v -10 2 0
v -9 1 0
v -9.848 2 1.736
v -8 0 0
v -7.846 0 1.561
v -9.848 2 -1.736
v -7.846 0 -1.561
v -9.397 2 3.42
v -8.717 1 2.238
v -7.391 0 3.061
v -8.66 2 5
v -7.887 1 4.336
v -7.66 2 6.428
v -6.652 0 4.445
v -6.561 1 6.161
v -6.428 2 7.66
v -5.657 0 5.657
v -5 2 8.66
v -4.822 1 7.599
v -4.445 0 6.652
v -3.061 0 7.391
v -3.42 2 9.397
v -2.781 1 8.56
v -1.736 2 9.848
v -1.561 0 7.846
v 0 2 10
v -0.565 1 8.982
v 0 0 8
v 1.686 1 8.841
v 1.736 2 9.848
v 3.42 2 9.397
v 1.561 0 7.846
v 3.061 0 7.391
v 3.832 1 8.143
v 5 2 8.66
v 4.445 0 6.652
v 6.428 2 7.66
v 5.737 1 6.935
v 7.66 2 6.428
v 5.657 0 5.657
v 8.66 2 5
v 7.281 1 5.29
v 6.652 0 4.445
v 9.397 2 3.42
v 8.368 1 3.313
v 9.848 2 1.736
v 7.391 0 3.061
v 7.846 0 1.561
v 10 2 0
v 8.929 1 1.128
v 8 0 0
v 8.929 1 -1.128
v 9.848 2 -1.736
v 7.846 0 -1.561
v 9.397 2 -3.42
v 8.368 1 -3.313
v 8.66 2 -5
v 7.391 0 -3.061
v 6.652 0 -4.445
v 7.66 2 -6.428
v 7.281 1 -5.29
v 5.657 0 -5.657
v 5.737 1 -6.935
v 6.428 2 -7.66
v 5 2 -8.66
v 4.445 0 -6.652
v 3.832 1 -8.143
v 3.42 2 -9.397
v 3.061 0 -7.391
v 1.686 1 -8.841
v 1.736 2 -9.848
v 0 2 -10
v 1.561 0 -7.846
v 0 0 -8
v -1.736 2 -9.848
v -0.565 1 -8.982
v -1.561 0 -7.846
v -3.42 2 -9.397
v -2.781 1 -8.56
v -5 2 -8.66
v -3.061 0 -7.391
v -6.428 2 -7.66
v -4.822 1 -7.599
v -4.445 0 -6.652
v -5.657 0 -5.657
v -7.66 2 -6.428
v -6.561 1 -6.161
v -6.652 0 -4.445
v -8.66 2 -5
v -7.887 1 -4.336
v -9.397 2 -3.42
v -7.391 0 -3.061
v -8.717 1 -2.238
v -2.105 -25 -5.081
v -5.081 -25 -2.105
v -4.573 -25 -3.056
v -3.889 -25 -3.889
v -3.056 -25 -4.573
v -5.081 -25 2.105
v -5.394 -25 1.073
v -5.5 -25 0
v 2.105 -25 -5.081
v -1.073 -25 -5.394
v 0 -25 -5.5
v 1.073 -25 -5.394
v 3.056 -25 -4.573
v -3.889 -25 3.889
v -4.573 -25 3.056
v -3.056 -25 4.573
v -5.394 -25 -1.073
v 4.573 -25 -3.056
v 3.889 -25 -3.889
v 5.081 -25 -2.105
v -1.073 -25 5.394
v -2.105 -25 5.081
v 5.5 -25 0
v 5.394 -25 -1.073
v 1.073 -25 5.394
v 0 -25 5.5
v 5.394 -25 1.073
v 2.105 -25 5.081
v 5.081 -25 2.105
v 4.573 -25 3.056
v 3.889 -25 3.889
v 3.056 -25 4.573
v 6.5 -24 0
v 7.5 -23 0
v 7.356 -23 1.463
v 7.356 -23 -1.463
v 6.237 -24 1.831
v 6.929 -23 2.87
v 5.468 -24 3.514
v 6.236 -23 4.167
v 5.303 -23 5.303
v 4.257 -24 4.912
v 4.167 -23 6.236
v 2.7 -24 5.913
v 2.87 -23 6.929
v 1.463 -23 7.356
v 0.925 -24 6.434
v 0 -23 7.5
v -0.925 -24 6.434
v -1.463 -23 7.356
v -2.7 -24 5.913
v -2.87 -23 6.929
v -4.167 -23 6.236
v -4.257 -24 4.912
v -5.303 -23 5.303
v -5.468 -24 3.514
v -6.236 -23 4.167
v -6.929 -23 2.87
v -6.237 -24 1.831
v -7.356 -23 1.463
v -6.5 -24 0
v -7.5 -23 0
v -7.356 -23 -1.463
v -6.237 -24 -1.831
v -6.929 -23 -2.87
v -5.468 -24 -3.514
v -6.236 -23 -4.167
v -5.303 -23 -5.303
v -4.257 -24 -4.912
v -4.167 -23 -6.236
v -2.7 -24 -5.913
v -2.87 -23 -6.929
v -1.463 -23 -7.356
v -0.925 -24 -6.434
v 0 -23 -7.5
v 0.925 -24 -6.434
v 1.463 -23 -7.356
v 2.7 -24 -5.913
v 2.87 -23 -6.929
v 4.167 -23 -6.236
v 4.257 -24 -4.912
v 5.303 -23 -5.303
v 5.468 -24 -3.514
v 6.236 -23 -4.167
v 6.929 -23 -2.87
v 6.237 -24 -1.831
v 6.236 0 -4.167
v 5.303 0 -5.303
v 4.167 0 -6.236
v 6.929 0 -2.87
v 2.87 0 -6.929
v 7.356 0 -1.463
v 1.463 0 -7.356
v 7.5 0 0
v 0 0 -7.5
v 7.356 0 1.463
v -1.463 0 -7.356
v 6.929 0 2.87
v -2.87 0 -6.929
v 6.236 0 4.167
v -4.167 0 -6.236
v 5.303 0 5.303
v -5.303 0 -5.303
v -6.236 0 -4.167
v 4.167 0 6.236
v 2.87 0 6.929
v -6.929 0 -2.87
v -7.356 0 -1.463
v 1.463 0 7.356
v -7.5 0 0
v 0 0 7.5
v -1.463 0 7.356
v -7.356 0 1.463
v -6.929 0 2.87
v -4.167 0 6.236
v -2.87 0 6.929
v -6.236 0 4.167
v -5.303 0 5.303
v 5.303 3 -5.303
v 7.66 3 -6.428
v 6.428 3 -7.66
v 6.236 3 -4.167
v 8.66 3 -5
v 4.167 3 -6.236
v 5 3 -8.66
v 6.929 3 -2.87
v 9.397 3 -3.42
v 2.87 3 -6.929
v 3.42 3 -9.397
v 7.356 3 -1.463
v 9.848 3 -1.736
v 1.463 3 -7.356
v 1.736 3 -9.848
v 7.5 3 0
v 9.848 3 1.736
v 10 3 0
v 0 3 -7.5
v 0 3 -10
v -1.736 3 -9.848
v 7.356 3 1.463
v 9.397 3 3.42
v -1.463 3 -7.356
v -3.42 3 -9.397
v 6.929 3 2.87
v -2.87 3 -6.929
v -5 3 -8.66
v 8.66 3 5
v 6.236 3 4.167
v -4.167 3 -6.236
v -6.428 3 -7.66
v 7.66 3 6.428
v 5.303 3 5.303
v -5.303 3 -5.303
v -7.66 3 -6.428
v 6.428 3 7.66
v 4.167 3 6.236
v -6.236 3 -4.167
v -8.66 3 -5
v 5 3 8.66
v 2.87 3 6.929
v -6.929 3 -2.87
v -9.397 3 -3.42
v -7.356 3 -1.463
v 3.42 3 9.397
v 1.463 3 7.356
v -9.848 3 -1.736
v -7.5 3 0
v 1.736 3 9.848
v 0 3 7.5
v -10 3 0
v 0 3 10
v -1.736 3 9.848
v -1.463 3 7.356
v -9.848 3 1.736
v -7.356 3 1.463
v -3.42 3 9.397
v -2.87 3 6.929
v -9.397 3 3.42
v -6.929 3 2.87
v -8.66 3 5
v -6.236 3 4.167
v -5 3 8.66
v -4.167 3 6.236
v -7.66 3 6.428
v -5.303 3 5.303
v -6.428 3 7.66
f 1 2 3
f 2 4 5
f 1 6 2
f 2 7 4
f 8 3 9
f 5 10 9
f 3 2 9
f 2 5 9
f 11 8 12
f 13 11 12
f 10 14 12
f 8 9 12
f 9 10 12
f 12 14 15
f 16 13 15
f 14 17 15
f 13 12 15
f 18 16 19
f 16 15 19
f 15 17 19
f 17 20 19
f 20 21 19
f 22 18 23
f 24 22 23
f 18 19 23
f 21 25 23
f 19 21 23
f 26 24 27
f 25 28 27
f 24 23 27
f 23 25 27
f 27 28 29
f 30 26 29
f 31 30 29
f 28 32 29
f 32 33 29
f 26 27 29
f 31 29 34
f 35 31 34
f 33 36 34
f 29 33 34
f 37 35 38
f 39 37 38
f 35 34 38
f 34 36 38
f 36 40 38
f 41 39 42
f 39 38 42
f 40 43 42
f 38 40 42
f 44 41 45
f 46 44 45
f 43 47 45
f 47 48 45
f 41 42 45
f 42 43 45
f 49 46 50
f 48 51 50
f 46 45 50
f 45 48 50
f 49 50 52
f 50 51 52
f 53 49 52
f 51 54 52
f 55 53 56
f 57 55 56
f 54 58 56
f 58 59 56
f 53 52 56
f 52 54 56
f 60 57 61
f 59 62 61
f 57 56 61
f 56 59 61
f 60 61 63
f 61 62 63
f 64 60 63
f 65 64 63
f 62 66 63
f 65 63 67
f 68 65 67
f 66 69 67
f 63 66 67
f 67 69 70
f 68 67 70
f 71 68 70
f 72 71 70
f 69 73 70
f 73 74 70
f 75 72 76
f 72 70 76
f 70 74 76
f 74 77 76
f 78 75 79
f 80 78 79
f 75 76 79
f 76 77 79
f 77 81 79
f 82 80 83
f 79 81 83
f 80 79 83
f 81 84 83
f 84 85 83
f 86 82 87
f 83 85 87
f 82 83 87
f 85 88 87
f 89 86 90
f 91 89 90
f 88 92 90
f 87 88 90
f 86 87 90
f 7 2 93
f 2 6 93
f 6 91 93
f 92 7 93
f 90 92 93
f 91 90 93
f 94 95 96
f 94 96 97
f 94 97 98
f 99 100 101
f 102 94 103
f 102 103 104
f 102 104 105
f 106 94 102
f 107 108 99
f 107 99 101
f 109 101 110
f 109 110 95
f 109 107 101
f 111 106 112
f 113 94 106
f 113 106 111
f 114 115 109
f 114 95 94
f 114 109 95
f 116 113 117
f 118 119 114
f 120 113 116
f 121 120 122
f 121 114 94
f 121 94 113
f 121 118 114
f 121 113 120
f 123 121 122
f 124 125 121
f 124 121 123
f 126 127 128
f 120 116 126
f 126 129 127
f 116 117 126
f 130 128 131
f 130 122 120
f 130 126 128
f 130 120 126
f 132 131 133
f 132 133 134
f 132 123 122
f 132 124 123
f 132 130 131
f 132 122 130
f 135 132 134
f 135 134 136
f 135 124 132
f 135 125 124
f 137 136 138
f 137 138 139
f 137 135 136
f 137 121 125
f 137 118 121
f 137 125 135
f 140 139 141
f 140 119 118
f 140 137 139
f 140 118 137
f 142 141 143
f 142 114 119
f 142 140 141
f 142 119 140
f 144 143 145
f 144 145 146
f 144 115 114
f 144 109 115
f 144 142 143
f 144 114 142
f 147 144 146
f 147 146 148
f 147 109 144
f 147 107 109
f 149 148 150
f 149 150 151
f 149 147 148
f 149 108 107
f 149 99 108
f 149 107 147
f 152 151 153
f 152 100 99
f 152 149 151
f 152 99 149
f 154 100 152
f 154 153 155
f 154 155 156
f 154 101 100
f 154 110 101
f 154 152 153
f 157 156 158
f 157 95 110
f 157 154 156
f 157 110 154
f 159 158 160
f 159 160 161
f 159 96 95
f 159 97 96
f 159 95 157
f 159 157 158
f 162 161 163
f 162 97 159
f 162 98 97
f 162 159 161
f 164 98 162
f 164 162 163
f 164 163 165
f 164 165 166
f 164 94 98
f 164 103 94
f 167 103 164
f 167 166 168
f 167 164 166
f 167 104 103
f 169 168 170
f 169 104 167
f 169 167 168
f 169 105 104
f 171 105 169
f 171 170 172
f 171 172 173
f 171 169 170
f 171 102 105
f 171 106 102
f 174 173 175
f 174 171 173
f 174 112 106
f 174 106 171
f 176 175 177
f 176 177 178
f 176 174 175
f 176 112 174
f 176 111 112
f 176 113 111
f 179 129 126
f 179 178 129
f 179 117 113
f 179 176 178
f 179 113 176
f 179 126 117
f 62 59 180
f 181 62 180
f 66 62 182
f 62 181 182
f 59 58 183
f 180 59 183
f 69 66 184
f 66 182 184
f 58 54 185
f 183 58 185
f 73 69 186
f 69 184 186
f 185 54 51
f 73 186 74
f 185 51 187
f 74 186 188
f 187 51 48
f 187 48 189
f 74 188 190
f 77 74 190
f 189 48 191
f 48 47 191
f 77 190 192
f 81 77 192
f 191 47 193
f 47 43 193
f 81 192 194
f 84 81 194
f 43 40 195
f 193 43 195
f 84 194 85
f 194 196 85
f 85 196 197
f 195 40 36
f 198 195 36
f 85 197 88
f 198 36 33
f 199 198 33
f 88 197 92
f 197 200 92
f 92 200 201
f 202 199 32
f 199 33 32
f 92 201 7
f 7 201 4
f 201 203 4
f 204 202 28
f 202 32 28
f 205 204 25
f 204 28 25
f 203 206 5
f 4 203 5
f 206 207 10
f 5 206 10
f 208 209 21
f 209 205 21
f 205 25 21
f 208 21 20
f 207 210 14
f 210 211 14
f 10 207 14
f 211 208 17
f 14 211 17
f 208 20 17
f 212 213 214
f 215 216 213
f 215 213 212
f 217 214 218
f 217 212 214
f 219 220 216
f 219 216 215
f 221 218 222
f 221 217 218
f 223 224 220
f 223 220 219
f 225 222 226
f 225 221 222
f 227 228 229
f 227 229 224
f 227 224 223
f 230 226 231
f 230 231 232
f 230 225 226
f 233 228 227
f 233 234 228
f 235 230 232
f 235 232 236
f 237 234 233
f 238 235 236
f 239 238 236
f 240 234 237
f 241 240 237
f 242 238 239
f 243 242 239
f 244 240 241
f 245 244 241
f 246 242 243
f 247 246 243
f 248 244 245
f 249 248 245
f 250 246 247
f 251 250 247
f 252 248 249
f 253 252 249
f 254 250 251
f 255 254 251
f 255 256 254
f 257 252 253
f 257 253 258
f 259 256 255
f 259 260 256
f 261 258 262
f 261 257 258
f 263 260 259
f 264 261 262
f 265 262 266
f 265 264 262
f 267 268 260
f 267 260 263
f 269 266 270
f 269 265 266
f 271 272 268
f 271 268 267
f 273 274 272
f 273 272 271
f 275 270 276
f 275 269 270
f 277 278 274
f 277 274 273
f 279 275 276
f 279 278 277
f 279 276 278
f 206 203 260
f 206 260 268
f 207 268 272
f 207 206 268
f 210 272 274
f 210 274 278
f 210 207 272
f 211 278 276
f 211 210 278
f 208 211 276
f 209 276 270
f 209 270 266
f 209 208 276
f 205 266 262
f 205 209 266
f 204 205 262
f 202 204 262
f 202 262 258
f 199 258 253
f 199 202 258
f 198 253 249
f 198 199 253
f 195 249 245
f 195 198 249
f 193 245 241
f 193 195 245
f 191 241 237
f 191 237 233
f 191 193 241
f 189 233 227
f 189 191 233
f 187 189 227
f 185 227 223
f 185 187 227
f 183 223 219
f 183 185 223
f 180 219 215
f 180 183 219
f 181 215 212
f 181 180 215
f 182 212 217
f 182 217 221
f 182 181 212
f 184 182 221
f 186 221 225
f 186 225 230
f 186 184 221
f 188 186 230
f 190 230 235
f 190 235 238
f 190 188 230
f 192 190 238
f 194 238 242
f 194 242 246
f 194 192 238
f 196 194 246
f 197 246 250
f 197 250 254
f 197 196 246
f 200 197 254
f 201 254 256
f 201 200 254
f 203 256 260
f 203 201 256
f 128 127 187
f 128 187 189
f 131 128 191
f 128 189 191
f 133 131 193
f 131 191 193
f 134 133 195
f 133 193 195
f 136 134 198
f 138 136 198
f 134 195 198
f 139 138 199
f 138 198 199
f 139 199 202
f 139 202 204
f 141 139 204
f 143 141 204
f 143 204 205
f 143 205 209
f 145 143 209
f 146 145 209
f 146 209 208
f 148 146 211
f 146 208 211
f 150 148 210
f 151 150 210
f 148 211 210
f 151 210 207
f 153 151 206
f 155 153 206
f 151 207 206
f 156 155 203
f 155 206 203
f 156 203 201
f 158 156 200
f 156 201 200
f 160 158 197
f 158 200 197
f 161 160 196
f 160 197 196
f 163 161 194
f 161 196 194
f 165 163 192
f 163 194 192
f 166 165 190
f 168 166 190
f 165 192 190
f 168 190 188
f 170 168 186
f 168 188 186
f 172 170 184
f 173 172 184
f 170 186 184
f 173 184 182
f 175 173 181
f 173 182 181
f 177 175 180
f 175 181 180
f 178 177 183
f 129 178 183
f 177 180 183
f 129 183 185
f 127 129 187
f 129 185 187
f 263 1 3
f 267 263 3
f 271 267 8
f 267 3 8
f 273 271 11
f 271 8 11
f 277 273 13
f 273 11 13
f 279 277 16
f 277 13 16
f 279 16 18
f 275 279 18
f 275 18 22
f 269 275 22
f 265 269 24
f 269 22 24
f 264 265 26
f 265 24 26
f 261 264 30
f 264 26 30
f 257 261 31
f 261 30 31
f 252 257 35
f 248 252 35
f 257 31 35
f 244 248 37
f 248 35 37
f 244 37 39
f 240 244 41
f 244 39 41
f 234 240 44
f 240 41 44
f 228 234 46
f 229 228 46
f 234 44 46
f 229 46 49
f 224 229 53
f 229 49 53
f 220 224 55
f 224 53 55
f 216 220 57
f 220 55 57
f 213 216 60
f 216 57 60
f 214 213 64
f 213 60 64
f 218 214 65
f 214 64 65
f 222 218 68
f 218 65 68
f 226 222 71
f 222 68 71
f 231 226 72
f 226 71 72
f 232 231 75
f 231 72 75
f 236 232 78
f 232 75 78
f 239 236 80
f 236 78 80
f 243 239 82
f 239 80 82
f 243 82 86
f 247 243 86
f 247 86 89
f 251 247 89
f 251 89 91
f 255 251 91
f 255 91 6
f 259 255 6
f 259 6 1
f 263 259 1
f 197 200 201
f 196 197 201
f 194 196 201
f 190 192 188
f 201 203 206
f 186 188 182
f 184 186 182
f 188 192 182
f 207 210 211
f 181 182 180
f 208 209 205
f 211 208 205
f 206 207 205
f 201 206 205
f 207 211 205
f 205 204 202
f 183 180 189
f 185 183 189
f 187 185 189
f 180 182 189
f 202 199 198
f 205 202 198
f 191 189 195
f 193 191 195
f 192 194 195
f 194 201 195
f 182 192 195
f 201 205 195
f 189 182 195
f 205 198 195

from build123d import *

# Parameters (mm, degrees)
F0_R     = 7.5
F1_DEPTH = 25
F2_SIZE  = 2
F3_R     = 10
F3_R_2   = 7.5
F4_DEPTH = 3
F5_SIZE  = 2


with BuildPart() as f1:
    # F0 (on Front) → F1 (new body)
    with BuildSketch(Plane.XZ):
        Circle(F0_R)
    extrude(amount=F1_DEPTH)

    # F2
    f2_edges = [f1.edges().sort_by_distance(p)[0] for p in [
        (-7.5, -25, 0),
    ]]
    chamfer(f2_edges, length=F2_SIZE)


with BuildPart() as f4:
    # F3 (on face) → F4 (new body)
    with BuildSketch(Plane(origin=(0, 0, 0), x_dir=(-1, 0, 0), z_dir=(0, 1, 0))):
        Circle(F3_R)
        Circle(F3_R_2, mode=Mode.SUBTRACT)
    extrude(amount=F4_DEPTH)

    # F5
    f5_edges = [f4.edges().sort_by_distance(p)[0] for p in [
        (10, 0, 0),
    ]]
    chamfer(f5_edges, length=F5_SIZE)


solid = Compound([f1.part, f4.part])
